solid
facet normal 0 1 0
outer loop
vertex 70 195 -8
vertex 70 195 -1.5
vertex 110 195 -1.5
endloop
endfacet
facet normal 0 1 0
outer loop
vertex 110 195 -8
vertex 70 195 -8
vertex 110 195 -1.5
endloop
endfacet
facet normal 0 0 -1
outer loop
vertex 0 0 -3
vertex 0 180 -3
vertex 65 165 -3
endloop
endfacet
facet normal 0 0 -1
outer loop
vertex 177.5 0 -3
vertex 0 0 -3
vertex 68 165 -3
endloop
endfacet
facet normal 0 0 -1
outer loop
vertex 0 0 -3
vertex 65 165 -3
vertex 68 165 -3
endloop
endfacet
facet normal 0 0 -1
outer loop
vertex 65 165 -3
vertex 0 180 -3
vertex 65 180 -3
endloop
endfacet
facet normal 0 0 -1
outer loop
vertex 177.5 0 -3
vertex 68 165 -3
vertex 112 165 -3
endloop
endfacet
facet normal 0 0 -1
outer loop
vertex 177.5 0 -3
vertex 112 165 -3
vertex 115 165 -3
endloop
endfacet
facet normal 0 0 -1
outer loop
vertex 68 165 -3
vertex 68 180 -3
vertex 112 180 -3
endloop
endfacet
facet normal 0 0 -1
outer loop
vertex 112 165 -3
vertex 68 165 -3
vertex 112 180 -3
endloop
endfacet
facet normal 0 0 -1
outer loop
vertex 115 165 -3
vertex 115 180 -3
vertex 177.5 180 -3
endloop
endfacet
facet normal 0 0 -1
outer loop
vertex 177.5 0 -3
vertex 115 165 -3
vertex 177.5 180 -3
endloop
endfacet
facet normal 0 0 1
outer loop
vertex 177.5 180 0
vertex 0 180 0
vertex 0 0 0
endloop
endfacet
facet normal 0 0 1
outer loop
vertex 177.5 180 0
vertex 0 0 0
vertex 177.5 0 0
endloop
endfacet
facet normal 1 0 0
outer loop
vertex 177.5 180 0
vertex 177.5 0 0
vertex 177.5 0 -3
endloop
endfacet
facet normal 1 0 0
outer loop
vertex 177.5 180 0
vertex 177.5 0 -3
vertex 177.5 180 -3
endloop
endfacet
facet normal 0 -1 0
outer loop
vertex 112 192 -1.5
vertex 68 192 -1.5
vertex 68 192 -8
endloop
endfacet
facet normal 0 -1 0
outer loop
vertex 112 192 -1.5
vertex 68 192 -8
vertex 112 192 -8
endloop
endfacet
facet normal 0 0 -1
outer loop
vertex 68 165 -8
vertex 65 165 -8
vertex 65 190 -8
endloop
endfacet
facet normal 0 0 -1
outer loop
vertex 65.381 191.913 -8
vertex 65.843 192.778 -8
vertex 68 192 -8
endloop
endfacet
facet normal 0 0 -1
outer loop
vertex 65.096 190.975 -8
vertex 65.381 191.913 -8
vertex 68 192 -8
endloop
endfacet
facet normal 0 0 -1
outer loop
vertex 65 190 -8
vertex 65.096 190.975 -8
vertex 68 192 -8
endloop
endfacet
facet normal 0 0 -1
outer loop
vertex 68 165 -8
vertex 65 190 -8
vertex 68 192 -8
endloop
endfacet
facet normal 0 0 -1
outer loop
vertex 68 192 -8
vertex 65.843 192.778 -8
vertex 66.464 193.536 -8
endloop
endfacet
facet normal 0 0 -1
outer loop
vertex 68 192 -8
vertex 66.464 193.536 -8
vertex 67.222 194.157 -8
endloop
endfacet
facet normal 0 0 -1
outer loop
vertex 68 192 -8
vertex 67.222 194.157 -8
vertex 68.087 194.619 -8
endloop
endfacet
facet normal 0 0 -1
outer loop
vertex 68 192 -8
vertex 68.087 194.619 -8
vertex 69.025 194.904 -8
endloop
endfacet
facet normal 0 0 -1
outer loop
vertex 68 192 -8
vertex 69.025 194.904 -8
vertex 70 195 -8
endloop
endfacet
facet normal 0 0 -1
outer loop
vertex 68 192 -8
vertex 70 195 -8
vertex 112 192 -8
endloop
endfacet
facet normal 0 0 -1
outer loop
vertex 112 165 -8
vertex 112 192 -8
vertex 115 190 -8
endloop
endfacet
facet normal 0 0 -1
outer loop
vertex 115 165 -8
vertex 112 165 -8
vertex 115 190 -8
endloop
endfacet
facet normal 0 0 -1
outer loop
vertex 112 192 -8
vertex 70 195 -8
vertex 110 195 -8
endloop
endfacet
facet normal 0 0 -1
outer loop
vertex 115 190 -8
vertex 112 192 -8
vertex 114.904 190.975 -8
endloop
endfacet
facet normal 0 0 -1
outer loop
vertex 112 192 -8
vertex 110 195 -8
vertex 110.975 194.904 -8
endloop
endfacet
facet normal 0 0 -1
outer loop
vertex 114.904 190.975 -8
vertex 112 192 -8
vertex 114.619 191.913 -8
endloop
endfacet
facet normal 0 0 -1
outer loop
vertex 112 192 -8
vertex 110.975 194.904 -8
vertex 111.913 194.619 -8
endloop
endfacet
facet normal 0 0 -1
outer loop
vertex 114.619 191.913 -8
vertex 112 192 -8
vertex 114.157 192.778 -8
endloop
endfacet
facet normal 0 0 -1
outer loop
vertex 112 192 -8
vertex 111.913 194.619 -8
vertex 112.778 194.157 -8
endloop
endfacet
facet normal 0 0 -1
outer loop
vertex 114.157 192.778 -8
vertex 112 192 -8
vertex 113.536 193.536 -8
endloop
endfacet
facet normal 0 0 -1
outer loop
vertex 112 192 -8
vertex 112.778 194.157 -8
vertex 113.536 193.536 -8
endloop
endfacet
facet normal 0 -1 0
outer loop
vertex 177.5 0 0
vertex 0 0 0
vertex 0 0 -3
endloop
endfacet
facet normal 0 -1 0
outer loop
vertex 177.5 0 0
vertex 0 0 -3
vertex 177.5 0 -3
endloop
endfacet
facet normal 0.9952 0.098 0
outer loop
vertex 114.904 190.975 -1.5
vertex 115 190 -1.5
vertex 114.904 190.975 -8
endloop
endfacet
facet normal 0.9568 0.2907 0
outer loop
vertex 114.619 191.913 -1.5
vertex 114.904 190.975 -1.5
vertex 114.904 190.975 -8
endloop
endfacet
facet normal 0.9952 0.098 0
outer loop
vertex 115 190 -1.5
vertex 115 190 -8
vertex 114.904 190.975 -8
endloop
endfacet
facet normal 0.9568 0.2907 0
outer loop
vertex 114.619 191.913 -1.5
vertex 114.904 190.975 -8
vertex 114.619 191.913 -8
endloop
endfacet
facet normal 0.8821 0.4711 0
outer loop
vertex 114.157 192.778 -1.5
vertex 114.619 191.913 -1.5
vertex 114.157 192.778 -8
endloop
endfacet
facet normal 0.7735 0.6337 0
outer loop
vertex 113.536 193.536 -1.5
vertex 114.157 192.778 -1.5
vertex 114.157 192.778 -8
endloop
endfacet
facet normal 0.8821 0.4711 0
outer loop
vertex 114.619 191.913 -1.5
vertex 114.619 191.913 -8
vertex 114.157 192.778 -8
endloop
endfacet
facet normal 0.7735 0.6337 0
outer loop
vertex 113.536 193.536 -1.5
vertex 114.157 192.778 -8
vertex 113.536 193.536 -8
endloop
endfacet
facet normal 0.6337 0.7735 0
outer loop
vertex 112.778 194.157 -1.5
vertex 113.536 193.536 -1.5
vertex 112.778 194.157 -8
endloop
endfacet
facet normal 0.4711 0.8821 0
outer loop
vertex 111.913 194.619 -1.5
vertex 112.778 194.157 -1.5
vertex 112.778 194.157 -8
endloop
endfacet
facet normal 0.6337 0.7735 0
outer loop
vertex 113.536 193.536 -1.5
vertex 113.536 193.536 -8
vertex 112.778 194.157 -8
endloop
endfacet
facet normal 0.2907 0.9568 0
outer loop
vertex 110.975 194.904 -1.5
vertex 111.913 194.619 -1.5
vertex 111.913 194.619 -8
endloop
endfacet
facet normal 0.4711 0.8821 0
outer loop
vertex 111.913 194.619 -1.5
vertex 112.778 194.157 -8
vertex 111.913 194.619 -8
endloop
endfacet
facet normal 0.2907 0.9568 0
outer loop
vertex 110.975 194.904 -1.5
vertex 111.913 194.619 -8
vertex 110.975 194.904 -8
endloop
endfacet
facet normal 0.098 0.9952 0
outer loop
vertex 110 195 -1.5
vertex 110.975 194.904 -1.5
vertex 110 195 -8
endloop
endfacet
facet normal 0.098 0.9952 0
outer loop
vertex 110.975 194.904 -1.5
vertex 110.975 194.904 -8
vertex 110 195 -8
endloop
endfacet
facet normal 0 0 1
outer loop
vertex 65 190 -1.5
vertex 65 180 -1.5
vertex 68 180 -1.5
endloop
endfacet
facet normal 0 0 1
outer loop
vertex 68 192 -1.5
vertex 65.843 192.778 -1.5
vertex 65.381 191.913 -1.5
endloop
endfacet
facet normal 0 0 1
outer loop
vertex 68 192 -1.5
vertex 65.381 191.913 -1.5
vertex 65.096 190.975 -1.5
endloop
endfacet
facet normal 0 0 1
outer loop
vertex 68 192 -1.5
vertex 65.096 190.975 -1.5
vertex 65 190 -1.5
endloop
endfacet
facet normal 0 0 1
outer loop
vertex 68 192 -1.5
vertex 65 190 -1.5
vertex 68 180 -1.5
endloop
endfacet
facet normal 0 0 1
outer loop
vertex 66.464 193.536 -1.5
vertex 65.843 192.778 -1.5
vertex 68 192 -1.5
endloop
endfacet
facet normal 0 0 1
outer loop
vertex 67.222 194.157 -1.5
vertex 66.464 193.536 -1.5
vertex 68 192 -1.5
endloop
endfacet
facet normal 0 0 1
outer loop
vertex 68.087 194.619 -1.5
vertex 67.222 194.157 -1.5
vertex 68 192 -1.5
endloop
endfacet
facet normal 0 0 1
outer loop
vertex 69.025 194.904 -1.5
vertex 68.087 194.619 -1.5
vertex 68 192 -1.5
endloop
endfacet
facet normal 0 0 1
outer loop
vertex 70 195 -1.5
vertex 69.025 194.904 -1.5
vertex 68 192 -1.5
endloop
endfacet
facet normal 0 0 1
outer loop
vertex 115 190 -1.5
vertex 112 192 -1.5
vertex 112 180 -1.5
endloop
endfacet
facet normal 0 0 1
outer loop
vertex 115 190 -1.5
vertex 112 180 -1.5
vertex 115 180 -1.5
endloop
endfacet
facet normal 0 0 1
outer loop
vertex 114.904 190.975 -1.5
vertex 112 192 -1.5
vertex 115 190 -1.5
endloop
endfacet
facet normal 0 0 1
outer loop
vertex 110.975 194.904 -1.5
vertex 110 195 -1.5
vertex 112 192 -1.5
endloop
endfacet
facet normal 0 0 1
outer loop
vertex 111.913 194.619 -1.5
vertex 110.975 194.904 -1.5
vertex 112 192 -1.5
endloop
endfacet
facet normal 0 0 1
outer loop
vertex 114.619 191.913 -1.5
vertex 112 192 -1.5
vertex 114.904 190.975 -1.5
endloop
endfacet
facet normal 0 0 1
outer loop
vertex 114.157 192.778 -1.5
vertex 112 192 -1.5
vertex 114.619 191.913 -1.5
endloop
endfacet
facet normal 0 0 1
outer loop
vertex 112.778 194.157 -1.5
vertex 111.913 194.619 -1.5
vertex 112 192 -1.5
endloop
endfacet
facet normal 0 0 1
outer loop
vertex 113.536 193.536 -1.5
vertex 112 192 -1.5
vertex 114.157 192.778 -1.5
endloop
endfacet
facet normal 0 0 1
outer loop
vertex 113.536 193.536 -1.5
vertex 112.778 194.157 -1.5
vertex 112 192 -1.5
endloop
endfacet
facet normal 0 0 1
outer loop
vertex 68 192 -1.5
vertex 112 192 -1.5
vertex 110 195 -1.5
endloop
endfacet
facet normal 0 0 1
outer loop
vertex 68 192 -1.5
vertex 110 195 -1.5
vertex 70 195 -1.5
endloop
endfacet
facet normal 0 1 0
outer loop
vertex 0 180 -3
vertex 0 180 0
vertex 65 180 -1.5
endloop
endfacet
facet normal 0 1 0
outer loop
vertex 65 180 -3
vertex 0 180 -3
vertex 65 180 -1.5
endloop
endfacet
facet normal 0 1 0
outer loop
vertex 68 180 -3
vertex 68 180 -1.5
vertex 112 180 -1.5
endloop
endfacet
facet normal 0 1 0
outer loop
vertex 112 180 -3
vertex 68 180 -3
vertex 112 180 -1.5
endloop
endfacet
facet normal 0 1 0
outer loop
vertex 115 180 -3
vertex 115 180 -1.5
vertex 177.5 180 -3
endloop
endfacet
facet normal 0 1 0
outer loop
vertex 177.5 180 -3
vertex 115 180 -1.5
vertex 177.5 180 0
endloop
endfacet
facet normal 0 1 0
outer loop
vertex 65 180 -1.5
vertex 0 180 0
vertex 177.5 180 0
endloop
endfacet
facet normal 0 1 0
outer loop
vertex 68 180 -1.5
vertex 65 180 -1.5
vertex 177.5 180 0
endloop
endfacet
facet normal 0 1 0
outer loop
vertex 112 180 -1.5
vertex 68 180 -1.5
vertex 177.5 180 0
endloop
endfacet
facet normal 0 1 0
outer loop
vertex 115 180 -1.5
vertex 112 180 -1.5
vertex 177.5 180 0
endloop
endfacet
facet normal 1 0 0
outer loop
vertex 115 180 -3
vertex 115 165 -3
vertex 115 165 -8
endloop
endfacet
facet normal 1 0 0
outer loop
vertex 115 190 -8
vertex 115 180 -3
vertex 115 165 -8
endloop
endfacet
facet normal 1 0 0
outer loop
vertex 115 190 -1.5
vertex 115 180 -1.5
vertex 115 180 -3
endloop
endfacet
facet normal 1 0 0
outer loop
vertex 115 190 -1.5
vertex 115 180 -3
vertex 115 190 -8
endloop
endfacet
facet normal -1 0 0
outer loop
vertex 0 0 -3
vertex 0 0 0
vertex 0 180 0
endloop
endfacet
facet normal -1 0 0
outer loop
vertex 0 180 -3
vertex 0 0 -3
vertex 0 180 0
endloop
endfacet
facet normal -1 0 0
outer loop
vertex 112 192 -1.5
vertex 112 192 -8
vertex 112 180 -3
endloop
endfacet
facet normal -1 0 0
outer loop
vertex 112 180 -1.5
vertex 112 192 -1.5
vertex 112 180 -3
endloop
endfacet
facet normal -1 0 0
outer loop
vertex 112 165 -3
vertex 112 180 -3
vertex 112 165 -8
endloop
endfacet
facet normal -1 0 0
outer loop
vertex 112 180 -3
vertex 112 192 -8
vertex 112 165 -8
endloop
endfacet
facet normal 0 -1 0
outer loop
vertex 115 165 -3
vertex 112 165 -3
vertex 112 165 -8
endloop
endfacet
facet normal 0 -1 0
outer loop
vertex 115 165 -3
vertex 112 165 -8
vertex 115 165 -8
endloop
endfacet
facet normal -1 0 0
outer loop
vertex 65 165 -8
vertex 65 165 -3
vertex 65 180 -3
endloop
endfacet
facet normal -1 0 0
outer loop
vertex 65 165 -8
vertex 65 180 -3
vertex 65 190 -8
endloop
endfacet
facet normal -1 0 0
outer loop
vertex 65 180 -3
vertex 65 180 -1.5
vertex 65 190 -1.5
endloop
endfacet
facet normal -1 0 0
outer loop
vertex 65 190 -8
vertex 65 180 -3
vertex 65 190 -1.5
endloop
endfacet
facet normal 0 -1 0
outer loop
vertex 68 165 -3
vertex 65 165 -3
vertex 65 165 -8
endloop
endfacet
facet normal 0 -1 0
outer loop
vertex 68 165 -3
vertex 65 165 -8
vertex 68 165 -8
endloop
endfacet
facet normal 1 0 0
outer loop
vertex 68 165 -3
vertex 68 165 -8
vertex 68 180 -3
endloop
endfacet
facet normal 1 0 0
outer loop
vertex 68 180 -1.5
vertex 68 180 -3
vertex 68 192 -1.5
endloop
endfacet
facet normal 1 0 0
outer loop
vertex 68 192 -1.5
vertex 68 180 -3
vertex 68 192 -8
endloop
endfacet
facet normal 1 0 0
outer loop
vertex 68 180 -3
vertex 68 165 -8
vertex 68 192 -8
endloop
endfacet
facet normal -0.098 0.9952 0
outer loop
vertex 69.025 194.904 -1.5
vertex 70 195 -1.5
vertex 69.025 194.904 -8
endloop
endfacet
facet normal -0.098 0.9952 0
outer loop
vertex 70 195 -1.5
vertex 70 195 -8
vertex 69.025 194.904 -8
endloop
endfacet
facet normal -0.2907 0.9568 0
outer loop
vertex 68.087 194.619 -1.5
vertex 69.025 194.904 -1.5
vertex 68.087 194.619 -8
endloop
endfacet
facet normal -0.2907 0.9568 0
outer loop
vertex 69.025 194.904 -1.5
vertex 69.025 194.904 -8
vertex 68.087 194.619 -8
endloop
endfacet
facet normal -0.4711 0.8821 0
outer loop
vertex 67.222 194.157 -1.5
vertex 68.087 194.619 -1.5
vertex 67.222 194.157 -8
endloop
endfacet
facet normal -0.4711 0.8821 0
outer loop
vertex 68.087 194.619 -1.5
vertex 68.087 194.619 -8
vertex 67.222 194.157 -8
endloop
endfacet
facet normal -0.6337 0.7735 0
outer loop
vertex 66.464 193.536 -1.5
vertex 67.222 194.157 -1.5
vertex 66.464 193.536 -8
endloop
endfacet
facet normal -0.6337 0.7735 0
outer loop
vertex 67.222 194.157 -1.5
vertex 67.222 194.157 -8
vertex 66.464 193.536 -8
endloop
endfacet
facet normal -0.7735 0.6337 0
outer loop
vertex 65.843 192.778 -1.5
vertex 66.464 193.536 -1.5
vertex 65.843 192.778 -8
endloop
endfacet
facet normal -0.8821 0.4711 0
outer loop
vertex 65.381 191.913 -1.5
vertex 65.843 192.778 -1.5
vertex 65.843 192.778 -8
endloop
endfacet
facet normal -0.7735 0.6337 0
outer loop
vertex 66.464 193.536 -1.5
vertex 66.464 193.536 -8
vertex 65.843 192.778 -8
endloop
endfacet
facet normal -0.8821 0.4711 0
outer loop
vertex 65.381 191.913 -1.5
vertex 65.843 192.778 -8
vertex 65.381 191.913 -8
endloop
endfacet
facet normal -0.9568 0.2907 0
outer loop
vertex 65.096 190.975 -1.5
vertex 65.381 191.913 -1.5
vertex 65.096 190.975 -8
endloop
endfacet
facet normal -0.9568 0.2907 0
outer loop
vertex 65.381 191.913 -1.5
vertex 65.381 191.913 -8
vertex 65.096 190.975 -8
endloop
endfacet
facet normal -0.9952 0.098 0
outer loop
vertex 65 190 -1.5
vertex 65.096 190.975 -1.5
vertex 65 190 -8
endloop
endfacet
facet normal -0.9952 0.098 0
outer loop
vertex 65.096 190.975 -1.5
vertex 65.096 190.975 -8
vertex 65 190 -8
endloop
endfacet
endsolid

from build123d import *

# Parameters (mm, degrees)
SKETCH2_W           = 177.5
SKETCH2_H           = 180
BOSS_EXTRUDE1_DEPTH = 3
SKETCH4_W           = 50
SKETCH4_H           = 30
BOSS_EXTRUDE2_DEPTH = 6.5
CUT_EXTRUDE1_DEPTH  = 5
SKETCH6_W           = 44
SKETCH6_H           = 12
CUT_EXTRUDE2_DEPTH  = 6.5
FILLET1_R           = 5
FILLET2_R           = 5


with BuildPart() as part:
    # Sketch2 → Boss-Extrude1 (new body)
    with BuildSketch(Plane.XY):
        with Locations((88.75, 90)):
            Rectangle(SKETCH2_W, SKETCH2_H)
    extrude(amount=-BOSS_EXTRUDE1_DEPTH)

    # Sketch4 → Boss-Extrude2 (add)
    with BuildSketch(Plane.XY.offset(-1.5)):
        with Locations((90, 180)):
            Rectangle(SKETCH4_W, SKETCH4_H)
    extrude(amount=-BOSS_EXTRUDE2_DEPTH)

    # Sketch5 → Cut-Extrude1 (cut)
    with BuildSketch(Plane(origin=(0, 0, -8), x_dir=(-1, 0, 0), z_dir=(0, 0, -1))):
        Polygon((-112, 168), (-112, 165), (-68, 165), (-68, 168), (-68, 192), (-112, 192), align=None)
    extrude(amount=-CUT_EXTRUDE1_DEPTH, mode=Mode.SUBTRACT)

    # Sketch6 → Cut-Extrude2 (cut)
    with BuildSketch(Plane.XY.offset(-1.5)):
        with Locations((90, 186)):
            Rectangle(SKETCH6_W, SKETCH6_H)
    extrude(amount=-CUT_EXTRUDE2_DEPTH, mode=Mode.SUBTRACT)

    # Fillet1
    fillet1_edges = [part.edges().sort_by_distance(p)[0] for p in [
        (115, 195, -4.75),
    ]]
    fillet(fillet1_edges, radius=FILLET1_R)

    # Fillet2
    fillet2_edges = [part.edges().sort_by_distance(p)[0] for p in [
        (65, 195, -4.75),
    ]]
    fillet(fillet2_edges, radius=FILLET2_R)


solid = part.part
